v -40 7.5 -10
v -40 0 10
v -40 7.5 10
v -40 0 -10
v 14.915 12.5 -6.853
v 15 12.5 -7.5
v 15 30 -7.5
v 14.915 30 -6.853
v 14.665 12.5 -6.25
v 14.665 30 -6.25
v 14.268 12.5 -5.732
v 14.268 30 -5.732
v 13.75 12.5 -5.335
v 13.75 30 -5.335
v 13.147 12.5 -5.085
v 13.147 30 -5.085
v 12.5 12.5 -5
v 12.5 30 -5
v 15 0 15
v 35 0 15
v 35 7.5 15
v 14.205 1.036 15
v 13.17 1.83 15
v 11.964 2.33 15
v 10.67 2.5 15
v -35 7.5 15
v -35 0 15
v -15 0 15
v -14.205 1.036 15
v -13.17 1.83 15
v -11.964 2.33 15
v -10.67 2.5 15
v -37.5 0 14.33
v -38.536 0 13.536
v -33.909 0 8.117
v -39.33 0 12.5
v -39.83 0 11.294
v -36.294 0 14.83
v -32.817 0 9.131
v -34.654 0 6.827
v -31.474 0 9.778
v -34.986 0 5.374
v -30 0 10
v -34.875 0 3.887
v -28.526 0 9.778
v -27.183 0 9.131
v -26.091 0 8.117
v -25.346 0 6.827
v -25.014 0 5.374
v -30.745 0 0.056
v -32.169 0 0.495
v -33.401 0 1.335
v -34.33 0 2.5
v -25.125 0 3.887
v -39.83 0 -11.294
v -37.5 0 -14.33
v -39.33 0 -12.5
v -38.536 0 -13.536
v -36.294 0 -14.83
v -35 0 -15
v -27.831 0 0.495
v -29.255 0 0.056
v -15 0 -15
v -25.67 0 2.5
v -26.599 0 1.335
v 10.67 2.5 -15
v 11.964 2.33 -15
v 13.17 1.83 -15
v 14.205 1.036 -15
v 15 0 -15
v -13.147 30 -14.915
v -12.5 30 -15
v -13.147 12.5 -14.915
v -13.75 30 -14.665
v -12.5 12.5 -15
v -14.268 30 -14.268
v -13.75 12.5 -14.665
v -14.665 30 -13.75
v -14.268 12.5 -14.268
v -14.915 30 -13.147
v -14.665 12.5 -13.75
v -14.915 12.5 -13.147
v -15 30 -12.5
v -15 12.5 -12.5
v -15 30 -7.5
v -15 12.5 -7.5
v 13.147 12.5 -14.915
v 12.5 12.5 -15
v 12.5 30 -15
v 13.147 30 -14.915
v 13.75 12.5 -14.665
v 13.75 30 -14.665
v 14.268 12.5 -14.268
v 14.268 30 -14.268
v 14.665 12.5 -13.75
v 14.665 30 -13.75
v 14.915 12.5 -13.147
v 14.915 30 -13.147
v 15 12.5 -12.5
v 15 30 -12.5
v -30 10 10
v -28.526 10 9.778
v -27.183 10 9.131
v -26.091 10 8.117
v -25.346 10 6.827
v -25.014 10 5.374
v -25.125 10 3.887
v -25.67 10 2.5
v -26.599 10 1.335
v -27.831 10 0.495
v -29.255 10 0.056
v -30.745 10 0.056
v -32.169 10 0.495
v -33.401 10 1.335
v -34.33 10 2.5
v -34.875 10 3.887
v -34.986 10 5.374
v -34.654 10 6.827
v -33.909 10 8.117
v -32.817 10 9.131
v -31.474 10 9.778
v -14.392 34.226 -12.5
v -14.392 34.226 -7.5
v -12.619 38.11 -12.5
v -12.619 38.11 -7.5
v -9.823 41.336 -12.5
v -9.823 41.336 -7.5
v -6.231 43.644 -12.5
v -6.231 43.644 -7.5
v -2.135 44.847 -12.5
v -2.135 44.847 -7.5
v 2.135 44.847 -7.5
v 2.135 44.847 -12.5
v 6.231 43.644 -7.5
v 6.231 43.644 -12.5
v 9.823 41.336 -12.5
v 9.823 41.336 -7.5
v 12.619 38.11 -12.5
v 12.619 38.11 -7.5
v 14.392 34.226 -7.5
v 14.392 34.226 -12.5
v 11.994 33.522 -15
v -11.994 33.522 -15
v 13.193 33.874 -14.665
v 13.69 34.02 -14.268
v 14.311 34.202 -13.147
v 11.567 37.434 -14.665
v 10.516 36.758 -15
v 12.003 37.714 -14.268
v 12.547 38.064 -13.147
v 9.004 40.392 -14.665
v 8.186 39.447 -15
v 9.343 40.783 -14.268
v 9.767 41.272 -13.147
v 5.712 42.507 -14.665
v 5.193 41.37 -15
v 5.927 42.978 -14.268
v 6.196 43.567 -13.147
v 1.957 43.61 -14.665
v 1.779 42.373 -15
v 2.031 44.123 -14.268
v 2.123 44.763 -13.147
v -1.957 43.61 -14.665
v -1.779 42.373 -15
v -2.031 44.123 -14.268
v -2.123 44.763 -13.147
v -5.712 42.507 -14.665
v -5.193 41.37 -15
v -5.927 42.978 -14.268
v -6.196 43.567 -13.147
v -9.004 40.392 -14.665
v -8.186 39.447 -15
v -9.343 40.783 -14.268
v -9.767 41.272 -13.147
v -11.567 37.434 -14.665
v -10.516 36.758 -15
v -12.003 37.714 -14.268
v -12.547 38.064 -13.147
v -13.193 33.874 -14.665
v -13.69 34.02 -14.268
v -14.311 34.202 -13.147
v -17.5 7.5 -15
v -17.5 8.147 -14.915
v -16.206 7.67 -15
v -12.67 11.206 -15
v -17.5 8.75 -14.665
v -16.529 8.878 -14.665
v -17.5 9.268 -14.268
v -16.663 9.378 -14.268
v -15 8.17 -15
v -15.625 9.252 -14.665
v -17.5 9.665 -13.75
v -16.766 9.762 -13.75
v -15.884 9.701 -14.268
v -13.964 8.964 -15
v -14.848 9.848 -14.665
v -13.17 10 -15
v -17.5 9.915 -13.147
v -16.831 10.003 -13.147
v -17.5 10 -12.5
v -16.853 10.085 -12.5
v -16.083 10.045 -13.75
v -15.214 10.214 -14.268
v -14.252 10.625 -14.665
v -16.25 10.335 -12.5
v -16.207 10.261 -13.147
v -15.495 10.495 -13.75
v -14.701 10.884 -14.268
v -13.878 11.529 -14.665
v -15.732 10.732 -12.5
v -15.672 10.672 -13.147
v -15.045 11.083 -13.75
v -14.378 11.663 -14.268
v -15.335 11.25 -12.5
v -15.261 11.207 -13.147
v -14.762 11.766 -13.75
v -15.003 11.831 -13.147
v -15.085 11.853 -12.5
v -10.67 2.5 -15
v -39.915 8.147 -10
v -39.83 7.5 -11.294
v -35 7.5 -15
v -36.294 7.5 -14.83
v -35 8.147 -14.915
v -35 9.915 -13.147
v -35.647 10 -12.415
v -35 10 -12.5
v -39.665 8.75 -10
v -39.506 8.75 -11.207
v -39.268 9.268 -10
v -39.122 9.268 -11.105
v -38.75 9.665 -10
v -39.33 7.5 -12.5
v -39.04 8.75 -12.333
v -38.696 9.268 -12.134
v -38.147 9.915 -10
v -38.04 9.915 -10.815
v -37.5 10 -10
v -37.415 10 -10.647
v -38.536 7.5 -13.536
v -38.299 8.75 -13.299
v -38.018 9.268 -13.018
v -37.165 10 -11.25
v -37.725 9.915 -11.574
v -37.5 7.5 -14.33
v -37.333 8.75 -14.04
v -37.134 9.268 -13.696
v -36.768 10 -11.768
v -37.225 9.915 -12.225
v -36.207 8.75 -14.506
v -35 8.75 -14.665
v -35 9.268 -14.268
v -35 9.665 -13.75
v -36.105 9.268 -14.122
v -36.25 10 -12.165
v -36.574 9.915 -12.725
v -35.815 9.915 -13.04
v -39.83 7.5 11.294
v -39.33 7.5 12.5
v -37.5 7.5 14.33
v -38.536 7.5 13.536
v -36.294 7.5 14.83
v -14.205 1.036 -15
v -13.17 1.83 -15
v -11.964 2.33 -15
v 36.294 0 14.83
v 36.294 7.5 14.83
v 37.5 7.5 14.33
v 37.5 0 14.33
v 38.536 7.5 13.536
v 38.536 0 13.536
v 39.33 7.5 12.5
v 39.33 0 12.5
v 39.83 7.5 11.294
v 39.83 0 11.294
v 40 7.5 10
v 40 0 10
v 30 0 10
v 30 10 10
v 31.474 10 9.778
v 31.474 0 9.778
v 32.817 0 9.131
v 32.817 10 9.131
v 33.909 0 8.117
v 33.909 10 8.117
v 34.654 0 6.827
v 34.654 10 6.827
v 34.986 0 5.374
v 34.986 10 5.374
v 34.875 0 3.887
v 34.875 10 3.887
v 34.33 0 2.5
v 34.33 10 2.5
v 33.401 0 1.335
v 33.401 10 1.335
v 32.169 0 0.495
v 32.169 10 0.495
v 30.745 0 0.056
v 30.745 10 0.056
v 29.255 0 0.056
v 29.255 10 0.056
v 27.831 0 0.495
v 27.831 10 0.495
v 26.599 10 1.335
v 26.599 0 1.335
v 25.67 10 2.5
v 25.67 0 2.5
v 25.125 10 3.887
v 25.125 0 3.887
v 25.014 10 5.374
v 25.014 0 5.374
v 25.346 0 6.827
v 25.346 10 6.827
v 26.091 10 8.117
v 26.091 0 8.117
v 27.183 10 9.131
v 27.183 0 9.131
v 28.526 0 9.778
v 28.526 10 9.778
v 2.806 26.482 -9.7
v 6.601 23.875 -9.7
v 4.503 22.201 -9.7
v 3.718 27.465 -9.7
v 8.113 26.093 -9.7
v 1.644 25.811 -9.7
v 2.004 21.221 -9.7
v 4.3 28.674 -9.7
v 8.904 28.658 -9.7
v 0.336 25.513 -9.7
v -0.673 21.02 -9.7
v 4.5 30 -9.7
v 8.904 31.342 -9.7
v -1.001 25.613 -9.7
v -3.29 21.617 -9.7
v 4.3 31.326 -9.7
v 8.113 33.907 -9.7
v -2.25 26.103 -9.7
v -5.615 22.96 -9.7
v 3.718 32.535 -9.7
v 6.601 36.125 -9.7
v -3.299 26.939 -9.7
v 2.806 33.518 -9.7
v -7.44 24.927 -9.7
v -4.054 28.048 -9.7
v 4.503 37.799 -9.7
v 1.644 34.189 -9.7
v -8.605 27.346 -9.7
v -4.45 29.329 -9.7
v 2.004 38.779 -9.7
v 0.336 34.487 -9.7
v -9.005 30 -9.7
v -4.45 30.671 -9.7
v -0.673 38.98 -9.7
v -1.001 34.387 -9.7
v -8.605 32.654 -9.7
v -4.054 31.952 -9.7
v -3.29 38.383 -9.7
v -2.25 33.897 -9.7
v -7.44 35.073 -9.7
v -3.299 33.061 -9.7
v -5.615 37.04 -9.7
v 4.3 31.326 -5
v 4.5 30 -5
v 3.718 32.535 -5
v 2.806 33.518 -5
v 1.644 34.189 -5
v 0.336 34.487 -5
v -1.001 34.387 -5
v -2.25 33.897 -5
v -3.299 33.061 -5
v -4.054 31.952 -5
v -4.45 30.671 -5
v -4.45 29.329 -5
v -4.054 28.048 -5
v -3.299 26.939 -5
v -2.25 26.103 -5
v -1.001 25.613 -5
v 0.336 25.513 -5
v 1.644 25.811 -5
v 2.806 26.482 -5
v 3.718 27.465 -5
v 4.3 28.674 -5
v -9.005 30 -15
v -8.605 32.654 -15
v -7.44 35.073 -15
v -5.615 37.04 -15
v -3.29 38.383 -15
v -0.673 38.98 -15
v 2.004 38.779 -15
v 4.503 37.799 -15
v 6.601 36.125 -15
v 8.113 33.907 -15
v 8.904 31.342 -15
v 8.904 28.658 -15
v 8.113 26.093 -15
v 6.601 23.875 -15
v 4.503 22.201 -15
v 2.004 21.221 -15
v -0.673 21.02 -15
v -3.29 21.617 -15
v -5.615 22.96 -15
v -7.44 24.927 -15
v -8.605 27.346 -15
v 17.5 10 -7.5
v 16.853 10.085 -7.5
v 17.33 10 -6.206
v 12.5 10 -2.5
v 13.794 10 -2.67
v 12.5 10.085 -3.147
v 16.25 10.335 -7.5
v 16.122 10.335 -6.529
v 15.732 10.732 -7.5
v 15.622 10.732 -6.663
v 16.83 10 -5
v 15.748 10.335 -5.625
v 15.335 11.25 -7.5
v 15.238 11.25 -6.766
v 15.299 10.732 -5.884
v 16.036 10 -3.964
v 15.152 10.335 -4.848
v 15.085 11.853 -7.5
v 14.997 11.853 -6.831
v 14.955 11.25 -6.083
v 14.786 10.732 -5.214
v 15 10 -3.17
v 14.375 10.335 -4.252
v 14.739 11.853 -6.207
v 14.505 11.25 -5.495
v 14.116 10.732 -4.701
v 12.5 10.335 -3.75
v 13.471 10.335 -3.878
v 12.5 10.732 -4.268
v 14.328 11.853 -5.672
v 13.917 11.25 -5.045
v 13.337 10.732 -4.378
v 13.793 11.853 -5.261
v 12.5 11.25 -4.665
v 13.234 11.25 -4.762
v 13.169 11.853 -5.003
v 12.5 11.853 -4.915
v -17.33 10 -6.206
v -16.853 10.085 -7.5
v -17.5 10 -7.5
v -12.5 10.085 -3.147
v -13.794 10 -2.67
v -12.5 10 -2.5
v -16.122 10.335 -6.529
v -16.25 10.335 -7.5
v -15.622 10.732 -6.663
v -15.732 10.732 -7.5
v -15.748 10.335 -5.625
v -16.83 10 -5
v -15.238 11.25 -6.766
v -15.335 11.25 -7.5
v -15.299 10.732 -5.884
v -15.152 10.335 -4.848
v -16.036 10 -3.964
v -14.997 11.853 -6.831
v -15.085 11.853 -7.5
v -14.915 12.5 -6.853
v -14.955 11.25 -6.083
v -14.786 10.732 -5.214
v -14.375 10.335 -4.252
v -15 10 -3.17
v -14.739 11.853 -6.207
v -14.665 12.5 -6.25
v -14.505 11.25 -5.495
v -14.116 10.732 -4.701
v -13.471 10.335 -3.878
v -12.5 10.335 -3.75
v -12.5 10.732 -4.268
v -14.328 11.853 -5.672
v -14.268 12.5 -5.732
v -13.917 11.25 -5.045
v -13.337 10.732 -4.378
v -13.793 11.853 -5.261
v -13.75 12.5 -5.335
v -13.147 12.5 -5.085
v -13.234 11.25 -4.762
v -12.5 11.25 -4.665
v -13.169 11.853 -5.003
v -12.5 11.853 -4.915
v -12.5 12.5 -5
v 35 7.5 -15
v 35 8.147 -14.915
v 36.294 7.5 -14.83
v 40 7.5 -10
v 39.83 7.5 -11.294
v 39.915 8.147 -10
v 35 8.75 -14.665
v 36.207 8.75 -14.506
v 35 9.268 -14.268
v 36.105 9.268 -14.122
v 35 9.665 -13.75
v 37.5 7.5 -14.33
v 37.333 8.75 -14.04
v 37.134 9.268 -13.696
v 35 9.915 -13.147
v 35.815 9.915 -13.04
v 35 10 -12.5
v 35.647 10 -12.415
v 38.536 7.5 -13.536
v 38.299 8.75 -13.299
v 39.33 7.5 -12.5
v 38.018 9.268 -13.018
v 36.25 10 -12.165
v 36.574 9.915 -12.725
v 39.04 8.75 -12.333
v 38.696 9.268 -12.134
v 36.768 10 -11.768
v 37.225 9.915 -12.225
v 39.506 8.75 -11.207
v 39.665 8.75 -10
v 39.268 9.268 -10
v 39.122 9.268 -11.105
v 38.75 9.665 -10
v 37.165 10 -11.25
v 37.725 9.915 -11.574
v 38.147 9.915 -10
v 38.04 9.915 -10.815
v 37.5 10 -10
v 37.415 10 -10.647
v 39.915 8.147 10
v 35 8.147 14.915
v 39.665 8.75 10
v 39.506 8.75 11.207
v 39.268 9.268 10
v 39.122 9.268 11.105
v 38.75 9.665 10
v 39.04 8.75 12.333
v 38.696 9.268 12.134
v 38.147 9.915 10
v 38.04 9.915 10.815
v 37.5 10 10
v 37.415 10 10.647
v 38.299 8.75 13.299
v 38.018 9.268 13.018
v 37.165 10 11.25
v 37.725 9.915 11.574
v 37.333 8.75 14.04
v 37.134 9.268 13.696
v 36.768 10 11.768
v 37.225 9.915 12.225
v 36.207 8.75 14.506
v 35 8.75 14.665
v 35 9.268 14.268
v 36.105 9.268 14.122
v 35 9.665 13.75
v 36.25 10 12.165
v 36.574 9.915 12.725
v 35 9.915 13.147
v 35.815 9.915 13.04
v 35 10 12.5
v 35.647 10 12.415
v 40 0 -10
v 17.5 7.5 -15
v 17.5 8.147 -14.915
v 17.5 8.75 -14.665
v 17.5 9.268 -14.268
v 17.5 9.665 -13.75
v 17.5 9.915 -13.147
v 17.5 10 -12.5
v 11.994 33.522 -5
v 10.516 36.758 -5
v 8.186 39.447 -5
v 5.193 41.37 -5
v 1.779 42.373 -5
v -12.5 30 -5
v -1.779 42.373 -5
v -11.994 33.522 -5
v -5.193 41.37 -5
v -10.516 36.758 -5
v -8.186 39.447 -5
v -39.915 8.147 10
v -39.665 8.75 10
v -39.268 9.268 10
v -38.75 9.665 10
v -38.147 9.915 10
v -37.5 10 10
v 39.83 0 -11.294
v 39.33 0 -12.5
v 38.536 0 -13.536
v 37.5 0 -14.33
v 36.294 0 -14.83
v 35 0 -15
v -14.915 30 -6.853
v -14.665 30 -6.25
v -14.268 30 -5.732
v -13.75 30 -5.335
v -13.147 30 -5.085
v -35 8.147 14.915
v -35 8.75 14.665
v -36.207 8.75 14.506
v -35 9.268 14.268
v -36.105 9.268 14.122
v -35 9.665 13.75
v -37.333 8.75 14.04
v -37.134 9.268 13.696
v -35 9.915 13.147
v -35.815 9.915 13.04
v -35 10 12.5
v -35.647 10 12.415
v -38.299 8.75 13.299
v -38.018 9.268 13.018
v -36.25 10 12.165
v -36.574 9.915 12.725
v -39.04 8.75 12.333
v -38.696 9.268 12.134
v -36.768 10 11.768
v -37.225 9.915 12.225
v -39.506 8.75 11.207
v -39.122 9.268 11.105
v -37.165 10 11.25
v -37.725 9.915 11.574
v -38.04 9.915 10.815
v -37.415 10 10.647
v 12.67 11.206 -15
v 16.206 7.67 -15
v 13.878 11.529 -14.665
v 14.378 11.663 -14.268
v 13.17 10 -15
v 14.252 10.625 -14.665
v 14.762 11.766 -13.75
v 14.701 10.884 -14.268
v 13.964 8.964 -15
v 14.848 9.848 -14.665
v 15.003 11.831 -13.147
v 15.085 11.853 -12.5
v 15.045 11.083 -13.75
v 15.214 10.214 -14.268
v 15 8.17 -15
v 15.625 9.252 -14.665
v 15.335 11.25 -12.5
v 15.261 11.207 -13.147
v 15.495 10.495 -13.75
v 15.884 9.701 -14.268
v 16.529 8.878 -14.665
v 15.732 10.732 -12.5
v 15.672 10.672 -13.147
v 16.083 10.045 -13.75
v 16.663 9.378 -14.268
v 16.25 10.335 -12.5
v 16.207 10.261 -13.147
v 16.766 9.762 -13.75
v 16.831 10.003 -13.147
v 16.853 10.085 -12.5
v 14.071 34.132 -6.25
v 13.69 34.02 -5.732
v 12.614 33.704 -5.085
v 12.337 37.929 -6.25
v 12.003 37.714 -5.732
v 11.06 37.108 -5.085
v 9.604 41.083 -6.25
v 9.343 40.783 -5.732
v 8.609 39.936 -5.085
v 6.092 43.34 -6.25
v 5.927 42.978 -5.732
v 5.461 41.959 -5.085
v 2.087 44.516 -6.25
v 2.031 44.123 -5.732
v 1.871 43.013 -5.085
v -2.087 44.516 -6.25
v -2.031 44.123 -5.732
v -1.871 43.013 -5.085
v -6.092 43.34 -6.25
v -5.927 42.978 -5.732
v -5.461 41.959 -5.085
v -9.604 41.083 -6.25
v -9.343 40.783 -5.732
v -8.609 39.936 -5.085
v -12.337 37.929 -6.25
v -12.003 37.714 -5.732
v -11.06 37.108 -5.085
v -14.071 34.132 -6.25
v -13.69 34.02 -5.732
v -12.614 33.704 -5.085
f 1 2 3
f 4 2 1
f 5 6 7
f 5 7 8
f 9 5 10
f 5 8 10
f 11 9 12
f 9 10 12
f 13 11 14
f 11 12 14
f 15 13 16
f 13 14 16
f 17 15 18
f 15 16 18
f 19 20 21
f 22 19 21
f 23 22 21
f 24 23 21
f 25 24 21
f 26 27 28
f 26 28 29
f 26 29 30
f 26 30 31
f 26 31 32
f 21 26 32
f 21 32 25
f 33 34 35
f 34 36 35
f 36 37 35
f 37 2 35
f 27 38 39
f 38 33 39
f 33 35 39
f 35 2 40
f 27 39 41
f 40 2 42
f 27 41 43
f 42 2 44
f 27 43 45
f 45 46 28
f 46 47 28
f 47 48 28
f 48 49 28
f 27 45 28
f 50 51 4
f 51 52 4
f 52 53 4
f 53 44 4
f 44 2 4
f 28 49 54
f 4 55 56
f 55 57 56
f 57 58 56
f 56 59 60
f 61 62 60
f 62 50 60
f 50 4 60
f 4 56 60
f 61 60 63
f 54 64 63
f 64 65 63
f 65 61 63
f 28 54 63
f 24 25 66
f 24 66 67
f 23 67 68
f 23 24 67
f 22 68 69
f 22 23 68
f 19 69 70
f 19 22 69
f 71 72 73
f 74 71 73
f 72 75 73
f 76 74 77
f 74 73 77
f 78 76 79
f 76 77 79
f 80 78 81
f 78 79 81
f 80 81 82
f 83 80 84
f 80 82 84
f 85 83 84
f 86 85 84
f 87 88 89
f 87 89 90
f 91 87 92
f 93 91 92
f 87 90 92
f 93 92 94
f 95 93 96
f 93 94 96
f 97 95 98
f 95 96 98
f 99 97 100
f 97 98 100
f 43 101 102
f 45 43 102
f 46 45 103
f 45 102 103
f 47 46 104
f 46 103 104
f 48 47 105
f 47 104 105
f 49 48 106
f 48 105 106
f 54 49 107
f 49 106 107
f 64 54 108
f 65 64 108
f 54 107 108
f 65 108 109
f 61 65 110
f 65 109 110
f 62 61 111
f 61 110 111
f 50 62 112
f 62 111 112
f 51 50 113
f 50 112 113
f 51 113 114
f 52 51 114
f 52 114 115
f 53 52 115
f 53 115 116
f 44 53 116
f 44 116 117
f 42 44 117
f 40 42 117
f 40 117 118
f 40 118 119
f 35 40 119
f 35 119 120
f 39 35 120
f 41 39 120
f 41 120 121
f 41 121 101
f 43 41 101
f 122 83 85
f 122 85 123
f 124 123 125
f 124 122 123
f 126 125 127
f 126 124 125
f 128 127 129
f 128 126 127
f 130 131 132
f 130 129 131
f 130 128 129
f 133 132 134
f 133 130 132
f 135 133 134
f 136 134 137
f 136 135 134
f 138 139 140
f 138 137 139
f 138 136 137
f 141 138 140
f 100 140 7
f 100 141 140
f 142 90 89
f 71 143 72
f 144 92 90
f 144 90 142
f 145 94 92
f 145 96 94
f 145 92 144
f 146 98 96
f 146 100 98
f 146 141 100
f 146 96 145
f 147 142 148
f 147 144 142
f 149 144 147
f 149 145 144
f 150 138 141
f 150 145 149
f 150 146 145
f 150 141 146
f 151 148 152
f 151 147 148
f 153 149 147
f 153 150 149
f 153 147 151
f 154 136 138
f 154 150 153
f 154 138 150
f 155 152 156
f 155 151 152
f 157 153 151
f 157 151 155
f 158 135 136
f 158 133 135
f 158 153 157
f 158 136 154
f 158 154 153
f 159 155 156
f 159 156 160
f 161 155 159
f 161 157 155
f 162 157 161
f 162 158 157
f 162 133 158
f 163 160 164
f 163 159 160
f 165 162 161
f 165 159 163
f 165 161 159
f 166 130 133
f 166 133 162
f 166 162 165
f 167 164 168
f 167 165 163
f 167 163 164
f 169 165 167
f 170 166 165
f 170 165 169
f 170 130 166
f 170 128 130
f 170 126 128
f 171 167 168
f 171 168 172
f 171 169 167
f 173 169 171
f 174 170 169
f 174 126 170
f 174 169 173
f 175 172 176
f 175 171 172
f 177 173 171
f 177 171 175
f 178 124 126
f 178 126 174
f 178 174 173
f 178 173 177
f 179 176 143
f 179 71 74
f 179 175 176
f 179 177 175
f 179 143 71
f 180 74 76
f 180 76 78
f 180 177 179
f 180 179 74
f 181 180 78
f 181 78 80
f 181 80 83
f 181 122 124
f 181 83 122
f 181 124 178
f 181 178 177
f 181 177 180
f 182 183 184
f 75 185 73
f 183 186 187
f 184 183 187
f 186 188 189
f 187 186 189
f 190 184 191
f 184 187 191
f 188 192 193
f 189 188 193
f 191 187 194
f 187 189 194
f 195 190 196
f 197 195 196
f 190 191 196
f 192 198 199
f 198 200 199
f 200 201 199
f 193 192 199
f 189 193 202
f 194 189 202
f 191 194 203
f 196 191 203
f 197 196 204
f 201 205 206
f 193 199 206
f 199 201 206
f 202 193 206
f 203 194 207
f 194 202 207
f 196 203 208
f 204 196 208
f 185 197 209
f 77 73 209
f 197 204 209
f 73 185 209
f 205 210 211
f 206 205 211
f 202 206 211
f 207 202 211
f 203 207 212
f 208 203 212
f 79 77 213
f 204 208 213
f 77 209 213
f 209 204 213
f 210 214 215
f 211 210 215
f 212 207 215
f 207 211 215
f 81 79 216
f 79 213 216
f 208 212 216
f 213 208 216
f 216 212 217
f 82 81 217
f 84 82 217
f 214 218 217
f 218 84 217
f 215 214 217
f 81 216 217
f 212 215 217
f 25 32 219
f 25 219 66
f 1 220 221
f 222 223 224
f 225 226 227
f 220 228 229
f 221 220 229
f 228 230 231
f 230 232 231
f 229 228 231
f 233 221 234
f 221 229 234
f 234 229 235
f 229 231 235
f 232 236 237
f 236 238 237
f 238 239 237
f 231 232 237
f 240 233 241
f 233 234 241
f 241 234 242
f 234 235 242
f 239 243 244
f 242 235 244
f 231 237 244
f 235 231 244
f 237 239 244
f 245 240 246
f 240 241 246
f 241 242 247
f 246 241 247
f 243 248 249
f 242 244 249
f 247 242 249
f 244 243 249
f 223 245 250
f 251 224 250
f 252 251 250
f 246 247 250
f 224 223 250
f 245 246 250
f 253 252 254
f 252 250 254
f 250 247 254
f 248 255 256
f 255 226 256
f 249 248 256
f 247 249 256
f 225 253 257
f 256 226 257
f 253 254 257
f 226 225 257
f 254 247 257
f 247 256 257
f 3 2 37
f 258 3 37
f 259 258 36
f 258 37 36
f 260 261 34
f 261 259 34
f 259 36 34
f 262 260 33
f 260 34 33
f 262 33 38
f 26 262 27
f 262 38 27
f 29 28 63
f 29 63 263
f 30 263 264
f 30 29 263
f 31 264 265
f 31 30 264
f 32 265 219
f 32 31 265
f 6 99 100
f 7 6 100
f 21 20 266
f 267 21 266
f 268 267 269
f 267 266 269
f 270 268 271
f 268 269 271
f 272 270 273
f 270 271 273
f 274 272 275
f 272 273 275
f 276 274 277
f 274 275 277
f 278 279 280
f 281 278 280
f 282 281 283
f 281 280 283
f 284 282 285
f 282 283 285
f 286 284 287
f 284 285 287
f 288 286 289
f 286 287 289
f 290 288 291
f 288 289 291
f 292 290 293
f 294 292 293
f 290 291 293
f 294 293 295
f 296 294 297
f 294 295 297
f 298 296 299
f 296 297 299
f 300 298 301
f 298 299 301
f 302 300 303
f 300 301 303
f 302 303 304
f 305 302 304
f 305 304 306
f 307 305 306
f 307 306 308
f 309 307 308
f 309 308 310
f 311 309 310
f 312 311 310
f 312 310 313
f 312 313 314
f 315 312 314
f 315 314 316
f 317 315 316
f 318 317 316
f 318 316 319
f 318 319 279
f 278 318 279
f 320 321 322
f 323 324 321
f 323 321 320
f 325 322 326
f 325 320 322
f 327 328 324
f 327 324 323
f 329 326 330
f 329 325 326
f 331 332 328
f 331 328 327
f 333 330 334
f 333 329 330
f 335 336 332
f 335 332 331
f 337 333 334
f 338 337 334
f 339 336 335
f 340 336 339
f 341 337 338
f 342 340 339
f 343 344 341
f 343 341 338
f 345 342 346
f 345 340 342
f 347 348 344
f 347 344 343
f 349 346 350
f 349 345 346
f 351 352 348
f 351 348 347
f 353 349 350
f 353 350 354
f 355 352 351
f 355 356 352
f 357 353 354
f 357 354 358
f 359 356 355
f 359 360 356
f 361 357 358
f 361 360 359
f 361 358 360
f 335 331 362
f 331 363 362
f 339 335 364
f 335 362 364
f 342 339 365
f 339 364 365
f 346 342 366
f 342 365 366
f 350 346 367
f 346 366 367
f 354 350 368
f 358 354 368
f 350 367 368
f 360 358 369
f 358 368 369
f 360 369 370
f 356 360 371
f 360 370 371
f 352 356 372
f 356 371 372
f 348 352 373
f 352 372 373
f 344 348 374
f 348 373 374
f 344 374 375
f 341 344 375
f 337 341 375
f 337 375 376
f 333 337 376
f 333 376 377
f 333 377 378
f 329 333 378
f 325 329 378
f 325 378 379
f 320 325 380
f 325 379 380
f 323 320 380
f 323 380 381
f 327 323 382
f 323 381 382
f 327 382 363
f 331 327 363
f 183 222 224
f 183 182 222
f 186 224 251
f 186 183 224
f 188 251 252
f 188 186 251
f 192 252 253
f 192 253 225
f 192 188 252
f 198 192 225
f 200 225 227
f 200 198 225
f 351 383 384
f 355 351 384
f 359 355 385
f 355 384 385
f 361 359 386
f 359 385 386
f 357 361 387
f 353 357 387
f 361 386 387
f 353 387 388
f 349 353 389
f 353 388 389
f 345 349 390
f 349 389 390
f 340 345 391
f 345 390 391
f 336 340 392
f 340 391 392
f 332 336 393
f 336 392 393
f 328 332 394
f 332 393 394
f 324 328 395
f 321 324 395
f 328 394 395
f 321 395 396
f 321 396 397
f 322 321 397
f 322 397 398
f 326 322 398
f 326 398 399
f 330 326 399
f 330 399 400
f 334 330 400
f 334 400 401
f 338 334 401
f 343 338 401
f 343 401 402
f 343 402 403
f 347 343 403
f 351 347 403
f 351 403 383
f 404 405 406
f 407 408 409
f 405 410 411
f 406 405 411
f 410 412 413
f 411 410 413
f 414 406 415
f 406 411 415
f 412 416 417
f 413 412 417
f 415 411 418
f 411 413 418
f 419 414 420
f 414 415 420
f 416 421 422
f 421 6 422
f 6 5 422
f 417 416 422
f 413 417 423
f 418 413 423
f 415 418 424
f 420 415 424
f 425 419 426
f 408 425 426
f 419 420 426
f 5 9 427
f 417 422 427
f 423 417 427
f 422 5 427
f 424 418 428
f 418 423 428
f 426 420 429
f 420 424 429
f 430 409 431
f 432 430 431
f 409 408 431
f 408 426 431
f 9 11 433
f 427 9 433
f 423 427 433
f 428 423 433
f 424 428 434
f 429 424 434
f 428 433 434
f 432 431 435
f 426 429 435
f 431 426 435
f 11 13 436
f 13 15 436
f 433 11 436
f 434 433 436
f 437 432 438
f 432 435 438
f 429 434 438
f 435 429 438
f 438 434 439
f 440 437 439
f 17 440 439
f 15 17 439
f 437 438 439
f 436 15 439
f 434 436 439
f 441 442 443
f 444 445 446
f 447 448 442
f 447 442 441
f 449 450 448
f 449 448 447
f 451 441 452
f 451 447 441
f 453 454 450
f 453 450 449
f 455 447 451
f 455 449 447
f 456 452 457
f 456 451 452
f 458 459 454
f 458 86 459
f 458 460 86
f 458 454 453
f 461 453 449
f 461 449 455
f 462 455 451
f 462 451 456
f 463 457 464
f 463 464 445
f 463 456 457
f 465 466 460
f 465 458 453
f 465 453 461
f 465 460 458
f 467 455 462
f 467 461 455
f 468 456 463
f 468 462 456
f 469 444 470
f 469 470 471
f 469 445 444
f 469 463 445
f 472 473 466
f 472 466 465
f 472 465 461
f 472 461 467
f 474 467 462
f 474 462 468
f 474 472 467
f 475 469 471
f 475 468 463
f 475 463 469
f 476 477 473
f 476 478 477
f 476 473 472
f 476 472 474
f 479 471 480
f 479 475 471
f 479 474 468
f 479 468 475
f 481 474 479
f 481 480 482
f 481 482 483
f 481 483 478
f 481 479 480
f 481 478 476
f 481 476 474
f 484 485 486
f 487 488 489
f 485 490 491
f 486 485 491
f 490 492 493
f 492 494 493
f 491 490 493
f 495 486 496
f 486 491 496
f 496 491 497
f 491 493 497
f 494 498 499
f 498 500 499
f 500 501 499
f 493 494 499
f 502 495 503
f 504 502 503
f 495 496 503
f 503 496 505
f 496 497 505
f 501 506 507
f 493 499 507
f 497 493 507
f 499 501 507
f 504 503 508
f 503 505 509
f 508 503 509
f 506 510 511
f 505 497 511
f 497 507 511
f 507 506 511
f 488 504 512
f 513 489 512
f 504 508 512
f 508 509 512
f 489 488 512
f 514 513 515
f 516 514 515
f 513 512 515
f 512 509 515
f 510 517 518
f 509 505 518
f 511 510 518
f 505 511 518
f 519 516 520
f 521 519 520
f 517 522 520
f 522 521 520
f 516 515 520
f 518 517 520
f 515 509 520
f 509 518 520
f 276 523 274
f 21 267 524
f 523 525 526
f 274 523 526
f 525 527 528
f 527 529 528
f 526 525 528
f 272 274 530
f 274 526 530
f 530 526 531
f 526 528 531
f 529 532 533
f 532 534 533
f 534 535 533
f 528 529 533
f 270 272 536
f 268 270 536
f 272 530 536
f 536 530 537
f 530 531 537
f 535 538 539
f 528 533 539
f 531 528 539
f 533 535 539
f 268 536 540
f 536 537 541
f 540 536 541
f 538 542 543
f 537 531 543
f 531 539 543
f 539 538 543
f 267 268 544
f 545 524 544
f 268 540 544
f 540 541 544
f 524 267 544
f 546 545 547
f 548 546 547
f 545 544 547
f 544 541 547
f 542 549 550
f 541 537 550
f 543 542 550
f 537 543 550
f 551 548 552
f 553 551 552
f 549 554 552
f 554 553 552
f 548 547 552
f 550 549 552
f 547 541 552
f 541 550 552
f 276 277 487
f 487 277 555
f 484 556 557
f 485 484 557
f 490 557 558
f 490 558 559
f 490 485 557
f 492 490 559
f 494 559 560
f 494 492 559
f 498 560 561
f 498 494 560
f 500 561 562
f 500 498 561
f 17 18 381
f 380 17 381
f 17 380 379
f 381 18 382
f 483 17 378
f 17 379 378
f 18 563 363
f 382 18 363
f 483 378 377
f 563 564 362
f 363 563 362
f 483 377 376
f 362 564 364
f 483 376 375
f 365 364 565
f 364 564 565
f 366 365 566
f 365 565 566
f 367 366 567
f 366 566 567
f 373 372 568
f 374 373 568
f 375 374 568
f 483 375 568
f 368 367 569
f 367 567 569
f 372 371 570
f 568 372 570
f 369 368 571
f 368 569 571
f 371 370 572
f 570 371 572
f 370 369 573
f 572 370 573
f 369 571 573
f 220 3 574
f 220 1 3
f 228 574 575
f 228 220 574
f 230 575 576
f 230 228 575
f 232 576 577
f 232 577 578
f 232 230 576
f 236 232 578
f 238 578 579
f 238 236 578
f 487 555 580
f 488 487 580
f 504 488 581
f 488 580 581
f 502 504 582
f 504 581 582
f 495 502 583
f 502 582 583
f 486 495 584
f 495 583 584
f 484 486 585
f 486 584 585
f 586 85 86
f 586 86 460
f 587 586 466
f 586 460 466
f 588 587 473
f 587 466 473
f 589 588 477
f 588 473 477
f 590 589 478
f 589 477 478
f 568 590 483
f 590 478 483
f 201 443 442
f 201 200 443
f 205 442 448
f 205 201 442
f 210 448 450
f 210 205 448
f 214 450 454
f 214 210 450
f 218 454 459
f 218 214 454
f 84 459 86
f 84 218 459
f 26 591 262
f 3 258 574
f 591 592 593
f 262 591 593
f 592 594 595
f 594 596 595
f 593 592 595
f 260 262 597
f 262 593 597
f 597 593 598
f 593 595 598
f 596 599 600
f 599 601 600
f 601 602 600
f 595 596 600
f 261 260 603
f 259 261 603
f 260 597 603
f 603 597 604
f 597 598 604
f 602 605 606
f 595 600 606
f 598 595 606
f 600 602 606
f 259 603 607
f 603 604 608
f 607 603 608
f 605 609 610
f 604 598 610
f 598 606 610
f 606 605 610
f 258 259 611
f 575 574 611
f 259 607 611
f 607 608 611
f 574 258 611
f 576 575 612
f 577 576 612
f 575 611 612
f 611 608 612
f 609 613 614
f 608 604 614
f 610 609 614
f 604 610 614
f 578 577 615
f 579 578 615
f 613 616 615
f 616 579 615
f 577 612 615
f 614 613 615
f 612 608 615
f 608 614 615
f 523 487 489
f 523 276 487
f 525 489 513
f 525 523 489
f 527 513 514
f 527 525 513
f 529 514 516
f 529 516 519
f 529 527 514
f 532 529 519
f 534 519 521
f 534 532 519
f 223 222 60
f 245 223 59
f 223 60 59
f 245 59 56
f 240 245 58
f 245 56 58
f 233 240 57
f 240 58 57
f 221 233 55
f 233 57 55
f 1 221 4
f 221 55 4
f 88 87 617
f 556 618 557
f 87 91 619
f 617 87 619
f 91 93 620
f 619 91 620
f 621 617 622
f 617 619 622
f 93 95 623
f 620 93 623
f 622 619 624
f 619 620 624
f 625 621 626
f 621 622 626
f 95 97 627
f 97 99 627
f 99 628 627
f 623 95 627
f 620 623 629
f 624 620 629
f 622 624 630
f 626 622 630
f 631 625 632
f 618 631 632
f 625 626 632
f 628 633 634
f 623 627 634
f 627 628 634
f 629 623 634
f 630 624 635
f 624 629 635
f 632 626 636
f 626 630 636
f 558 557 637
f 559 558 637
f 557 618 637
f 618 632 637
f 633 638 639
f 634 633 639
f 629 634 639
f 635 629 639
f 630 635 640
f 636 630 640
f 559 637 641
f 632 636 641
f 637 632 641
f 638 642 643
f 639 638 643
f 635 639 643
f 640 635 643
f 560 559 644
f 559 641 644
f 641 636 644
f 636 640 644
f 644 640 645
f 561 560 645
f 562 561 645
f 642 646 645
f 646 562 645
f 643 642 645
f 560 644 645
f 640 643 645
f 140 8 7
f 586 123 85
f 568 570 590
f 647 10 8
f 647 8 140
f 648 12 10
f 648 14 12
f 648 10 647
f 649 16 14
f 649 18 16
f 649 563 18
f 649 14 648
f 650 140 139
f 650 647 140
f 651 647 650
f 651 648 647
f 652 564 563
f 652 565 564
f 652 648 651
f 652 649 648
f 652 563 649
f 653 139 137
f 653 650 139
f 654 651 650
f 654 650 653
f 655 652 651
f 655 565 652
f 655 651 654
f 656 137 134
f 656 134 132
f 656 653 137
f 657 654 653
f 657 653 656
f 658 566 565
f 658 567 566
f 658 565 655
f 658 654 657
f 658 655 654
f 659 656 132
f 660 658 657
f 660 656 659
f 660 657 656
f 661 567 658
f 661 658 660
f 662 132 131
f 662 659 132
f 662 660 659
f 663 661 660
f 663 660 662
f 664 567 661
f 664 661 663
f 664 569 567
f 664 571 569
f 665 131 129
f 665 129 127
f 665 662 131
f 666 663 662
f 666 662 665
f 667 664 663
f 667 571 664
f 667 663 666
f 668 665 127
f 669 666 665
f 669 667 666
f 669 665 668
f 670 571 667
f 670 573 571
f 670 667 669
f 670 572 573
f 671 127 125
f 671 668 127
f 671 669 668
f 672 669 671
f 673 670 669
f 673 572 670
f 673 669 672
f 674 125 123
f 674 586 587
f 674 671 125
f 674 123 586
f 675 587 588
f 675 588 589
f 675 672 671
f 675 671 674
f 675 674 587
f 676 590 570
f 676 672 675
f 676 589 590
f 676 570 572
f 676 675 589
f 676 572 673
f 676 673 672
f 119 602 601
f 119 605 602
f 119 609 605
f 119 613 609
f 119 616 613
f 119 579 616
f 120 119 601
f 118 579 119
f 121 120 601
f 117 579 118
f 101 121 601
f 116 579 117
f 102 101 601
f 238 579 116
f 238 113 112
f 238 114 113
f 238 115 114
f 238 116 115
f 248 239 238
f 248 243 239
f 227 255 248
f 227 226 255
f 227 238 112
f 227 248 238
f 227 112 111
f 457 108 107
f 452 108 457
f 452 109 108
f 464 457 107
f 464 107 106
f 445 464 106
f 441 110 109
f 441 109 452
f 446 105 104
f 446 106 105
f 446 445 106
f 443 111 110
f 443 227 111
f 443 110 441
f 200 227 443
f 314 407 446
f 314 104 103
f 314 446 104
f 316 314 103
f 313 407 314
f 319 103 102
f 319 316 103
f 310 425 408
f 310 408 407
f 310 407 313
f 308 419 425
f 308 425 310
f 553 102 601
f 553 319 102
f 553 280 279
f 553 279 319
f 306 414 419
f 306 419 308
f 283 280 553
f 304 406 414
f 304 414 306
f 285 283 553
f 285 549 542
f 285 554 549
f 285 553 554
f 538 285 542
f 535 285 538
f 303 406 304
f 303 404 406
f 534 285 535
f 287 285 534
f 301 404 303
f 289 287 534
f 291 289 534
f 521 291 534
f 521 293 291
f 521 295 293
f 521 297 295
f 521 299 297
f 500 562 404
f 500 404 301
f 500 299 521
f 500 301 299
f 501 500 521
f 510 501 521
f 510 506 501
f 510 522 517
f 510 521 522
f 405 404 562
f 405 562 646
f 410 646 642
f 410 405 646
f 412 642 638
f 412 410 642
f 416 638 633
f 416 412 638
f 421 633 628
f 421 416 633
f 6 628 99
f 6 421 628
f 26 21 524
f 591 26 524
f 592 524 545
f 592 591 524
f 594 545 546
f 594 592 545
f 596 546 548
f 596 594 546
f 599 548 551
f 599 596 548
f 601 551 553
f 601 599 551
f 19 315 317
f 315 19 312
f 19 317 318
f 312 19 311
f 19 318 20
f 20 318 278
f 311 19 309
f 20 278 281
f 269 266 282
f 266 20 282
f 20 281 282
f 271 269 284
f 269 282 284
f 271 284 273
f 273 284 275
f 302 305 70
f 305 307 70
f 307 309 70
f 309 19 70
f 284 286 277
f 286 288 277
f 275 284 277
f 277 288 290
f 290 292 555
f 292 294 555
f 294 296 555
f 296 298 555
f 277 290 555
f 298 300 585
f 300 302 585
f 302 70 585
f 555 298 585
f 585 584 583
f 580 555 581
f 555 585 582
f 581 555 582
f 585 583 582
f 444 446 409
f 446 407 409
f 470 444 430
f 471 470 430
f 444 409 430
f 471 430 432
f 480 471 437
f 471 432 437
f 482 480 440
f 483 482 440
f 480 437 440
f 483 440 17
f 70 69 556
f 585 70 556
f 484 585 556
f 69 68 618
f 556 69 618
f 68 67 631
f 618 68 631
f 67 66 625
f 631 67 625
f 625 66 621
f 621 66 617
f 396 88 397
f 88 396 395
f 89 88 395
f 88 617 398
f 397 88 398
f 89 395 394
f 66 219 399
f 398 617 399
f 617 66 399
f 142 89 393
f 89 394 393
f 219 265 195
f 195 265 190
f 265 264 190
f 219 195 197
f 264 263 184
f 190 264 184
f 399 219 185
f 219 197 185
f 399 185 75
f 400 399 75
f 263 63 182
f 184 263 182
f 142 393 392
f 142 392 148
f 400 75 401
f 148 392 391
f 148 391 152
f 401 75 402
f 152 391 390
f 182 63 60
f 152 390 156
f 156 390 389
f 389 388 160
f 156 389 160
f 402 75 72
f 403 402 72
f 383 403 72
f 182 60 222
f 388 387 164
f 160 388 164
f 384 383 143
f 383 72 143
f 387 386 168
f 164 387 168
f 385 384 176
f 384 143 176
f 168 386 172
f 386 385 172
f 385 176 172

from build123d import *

# Parameters (mm, degrees)
SKETCH1_W                               = 80
SKETCH1_H                               = 30
BOSS_EXTRUDE1_DEPTH                     = 10
BOSS_EXTRUDE2_DEPTH                     = 10
SKETCH4_R                               = 15
BOSS_EXTRUDE3_DEPTH                     = 10
CBORE_FOR_M5_HEX_HEAD_BOLT1_D           = 9
CBORE_FOR_M5_HEX_HEAD_BOLT1_CBORE_D     = 18.01
CBORE_FOR_M5_HEX_HEAD_BOLT1_CBORE_DEPTH = 5.3
CUT_EXTRUDE1_REACH                      = 69.268
SKETCH7_W                               = 30
SKETCH7_H                               = 2.5
CUT_EXTRUDE2_REACH                      = 57.227
SKETCH8_R                               = 5
FILLET1_R                               = 5
FILLET2_R                               = 2.5


with BuildPart() as part:
    # Sketch1 → Boss-Extrude1 (new body)
    with BuildSketch(Plane(origin=(0, 0, 0), x_dir=(1, 0, 0), z_dir=(0, 1, 0))):
        Rectangle(SKETCH1_W, SKETCH1_H)
    extrude(amount=BOSS_EXTRUDE1_DEPTH)

    # Sketch2 → Boss-Extrude2 (add)
    with BuildSketch(Plane(origin=(0, 0, -15), x_dir=(-1, 0, 0), z_dir=(0, 0, -1))):
        Polygon((0, 30), (15, 30), (15, 0), (-15, 0), (-15, 30), align=None)
    extrude(amount=-BOSS_EXTRUDE2_DEPTH)

    # Sketch4 → Boss-Extrude3 (add)
    with BuildSketch(Plane(origin=(0, 0, -15), x_dir=(-1, 0, 0), z_dir=(0, 0, -1))):
        with Locations((0, 30)):
            Circle(SKETCH4_R)
    extrude(amount=-BOSS_EXTRUDE3_DEPTH)

    # CBORE for M5 Hex Head Bolt1 (through all)
    with Locations(Plane(origin=(0, 0, -15), x_dir=(-1, 0, 0), z_dir=(0, 0, -1))):
        with Locations((0, 30)):
            CounterBoreHole(CBORE_FOR_M5_HEX_HEAD_BOLT1_D / 2, CBORE_FOR_M5_HEX_HEAD_BOLT1_CBORE_D / 2, CBORE_FOR_M5_HEX_HEAD_BOLT1_CBORE_DEPTH)

    # Sketch7 → Cut-Extrude1 (cut, up to next)
    with BuildSketch(Plane.XY.offset(15), mode=Mode.PRIVATE) as cut_extrude1_sk1:
        with Locations((0, 1.25)):
            Rectangle(SKETCH7_W, SKETCH7_H)
    cut_extrude1_tool1 = extrude(cut_extrude1_sk1.sketch, amount=-CUT_EXTRUDE1_REACH, mode=Mode.PRIVATE) & part.part
    add(cut_extrude1_tool1.solids().sort_by_distance((0, 1.25, 15))[0], mode=Mode.SUBTRACT)

    # Sketch8 → Cut-Extrude2 (cut, up to next)
    with BuildSketch(Plane(origin=(0, 10, 0), x_dir=(1, 0, 0), z_dir=(0, 1, 0)), mode=Mode.PRIVATE) as cut_extrude2_sk1:
        with Locations(Location((-30, -5, 0), (0, 0, 270))):
            Circle(SKETCH8_R)
    cut_extrude2_tool1 = extrude(cut_extrude2_sk1.sketch, amount=-CUT_EXTRUDE2_REACH, mode=Mode.PRIVATE) & part.part
    # Sketch8 → Cut-Extrude2 (cut, up to next)
    with BuildSketch(Plane(origin=(0, 10, 0), x_dir=(1, 0, 0), z_dir=(0, 1, 0)), mode=Mode.PRIVATE) as cut_extrude2_sk2:
        with Locations(Location((30, -5, 0), (0, 0, 270))):
            Circle(SKETCH8_R)
    cut_extrude2_tool2 = extrude(cut_extrude2_sk2.sketch, amount=-CUT_EXTRUDE2_REACH, mode=Mode.PRIVATE) & part.part
    add(cut_extrude2_tool1.solids().sort_by_distance((-30, 10, 5))[0], mode=Mode.SUBTRACT)
    add(cut_extrude2_tool2.solids().sort_by_distance((30, 10, 5))[0], mode=Mode.SUBTRACT)

    # Fillet1
    # the kernel refuses this fillet: 5 mm, written as the material it adds along each edge
    with BuildSketch(Plane(origin=(15, 2.5, 15), x_dir=(-1, 0, 0), z_dir=(0, 0, -1))) as fillet1_piece_1:
        with BuildLine():
            CenterArc((4.330127019, -5), FILLET1_R, 90, 60)
            Line((0, -2.5), (0, 0))
            Line((0, 0), (4.330127019, 0))
        make_face()
    extrude(amount=30)
    with BuildSketch(Plane(origin=(-15, 2.5, 15), x_dir=(0, -1, 0), z_dir=(0, 0, -1))) as fillet1_piece_2:
        with BuildLine():
            CenterArc((5, -4.330127019), FILLET1_R, 120, 60)
            Line((0, -4.330127019), (0, 0))
            Line((0, 0), (2.5, 0))
        make_face()
    extrude(amount=30)
    # the kernel refuses this fillet: 5 mm, written as the material it takes off along each edge
    with BuildSketch(Plane(origin=(-40, -12.5, -15), x_dir=(0, 0, 1), z_dir=(0, 1, 0)), Plane(origin=(-40, -12.5, 15), x_dir=(1, 0, 0), z_dir=(0, 1, 0))) as fillet1_2_piece_1:
        with BuildLine():
            CenterArc((FILLET1_R, FILLET1_R), FILLET1_R, 180, 90)
            Line((0, FILLET1_R), (0, 0))
            Line((0, 0), (FILLET1_R, 0))
        make_face()
    extrude(amount=35, mode=Mode.SUBTRACT)
    with BuildSketch(Plane(origin=(40, -12.5, -15), x_dir=(0, 0, 1), z_dir=(0, 1, 0)), Plane(origin=(40, -12.5, 15), x_dir=(-1, 0, 0), z_dir=(0, 1, 0))) as fillet1_2_piece_2:
        with BuildLine():
            CenterArc((FILLET1_R, -FILLET1_R), FILLET1_R, 90, 90)
            Line((0, -FILLET1_R), (0, 0))
            Line((0, 0), (FILLET1_R, 0))
        make_face()
    extrude(amount=35, mode=Mode.SUBTRACT)

    # Fillet2
    fillet2_edges = [part.edges().sort_by_distance(p)[0] for p in [
        (-25, 10, -15),
        (-15, 20, -5),
        (15, 10, -10),
        (15, 20, -15),
        (15, 20, -5),
        (-15, 20, -15),
        (-15, 10, -10),
        (0, 10, -5),
        (0, 45, -15),
        (0, 45, -5),
        (-40, 10, 0),
        (25, 10, -15),
        (0, 10, 15),
        (40, 10, 0),
        (38.535533906, 10, 13.535533906),
        (38.535533906, 10, -13.535533906),
        (-38.535533906, 10, 13.535533906),
        (-38.535533906, 10, -13.535533906),
    ]]
    fillet(fillet2_edges, radius=FILLET2_R)


solid = part.part
